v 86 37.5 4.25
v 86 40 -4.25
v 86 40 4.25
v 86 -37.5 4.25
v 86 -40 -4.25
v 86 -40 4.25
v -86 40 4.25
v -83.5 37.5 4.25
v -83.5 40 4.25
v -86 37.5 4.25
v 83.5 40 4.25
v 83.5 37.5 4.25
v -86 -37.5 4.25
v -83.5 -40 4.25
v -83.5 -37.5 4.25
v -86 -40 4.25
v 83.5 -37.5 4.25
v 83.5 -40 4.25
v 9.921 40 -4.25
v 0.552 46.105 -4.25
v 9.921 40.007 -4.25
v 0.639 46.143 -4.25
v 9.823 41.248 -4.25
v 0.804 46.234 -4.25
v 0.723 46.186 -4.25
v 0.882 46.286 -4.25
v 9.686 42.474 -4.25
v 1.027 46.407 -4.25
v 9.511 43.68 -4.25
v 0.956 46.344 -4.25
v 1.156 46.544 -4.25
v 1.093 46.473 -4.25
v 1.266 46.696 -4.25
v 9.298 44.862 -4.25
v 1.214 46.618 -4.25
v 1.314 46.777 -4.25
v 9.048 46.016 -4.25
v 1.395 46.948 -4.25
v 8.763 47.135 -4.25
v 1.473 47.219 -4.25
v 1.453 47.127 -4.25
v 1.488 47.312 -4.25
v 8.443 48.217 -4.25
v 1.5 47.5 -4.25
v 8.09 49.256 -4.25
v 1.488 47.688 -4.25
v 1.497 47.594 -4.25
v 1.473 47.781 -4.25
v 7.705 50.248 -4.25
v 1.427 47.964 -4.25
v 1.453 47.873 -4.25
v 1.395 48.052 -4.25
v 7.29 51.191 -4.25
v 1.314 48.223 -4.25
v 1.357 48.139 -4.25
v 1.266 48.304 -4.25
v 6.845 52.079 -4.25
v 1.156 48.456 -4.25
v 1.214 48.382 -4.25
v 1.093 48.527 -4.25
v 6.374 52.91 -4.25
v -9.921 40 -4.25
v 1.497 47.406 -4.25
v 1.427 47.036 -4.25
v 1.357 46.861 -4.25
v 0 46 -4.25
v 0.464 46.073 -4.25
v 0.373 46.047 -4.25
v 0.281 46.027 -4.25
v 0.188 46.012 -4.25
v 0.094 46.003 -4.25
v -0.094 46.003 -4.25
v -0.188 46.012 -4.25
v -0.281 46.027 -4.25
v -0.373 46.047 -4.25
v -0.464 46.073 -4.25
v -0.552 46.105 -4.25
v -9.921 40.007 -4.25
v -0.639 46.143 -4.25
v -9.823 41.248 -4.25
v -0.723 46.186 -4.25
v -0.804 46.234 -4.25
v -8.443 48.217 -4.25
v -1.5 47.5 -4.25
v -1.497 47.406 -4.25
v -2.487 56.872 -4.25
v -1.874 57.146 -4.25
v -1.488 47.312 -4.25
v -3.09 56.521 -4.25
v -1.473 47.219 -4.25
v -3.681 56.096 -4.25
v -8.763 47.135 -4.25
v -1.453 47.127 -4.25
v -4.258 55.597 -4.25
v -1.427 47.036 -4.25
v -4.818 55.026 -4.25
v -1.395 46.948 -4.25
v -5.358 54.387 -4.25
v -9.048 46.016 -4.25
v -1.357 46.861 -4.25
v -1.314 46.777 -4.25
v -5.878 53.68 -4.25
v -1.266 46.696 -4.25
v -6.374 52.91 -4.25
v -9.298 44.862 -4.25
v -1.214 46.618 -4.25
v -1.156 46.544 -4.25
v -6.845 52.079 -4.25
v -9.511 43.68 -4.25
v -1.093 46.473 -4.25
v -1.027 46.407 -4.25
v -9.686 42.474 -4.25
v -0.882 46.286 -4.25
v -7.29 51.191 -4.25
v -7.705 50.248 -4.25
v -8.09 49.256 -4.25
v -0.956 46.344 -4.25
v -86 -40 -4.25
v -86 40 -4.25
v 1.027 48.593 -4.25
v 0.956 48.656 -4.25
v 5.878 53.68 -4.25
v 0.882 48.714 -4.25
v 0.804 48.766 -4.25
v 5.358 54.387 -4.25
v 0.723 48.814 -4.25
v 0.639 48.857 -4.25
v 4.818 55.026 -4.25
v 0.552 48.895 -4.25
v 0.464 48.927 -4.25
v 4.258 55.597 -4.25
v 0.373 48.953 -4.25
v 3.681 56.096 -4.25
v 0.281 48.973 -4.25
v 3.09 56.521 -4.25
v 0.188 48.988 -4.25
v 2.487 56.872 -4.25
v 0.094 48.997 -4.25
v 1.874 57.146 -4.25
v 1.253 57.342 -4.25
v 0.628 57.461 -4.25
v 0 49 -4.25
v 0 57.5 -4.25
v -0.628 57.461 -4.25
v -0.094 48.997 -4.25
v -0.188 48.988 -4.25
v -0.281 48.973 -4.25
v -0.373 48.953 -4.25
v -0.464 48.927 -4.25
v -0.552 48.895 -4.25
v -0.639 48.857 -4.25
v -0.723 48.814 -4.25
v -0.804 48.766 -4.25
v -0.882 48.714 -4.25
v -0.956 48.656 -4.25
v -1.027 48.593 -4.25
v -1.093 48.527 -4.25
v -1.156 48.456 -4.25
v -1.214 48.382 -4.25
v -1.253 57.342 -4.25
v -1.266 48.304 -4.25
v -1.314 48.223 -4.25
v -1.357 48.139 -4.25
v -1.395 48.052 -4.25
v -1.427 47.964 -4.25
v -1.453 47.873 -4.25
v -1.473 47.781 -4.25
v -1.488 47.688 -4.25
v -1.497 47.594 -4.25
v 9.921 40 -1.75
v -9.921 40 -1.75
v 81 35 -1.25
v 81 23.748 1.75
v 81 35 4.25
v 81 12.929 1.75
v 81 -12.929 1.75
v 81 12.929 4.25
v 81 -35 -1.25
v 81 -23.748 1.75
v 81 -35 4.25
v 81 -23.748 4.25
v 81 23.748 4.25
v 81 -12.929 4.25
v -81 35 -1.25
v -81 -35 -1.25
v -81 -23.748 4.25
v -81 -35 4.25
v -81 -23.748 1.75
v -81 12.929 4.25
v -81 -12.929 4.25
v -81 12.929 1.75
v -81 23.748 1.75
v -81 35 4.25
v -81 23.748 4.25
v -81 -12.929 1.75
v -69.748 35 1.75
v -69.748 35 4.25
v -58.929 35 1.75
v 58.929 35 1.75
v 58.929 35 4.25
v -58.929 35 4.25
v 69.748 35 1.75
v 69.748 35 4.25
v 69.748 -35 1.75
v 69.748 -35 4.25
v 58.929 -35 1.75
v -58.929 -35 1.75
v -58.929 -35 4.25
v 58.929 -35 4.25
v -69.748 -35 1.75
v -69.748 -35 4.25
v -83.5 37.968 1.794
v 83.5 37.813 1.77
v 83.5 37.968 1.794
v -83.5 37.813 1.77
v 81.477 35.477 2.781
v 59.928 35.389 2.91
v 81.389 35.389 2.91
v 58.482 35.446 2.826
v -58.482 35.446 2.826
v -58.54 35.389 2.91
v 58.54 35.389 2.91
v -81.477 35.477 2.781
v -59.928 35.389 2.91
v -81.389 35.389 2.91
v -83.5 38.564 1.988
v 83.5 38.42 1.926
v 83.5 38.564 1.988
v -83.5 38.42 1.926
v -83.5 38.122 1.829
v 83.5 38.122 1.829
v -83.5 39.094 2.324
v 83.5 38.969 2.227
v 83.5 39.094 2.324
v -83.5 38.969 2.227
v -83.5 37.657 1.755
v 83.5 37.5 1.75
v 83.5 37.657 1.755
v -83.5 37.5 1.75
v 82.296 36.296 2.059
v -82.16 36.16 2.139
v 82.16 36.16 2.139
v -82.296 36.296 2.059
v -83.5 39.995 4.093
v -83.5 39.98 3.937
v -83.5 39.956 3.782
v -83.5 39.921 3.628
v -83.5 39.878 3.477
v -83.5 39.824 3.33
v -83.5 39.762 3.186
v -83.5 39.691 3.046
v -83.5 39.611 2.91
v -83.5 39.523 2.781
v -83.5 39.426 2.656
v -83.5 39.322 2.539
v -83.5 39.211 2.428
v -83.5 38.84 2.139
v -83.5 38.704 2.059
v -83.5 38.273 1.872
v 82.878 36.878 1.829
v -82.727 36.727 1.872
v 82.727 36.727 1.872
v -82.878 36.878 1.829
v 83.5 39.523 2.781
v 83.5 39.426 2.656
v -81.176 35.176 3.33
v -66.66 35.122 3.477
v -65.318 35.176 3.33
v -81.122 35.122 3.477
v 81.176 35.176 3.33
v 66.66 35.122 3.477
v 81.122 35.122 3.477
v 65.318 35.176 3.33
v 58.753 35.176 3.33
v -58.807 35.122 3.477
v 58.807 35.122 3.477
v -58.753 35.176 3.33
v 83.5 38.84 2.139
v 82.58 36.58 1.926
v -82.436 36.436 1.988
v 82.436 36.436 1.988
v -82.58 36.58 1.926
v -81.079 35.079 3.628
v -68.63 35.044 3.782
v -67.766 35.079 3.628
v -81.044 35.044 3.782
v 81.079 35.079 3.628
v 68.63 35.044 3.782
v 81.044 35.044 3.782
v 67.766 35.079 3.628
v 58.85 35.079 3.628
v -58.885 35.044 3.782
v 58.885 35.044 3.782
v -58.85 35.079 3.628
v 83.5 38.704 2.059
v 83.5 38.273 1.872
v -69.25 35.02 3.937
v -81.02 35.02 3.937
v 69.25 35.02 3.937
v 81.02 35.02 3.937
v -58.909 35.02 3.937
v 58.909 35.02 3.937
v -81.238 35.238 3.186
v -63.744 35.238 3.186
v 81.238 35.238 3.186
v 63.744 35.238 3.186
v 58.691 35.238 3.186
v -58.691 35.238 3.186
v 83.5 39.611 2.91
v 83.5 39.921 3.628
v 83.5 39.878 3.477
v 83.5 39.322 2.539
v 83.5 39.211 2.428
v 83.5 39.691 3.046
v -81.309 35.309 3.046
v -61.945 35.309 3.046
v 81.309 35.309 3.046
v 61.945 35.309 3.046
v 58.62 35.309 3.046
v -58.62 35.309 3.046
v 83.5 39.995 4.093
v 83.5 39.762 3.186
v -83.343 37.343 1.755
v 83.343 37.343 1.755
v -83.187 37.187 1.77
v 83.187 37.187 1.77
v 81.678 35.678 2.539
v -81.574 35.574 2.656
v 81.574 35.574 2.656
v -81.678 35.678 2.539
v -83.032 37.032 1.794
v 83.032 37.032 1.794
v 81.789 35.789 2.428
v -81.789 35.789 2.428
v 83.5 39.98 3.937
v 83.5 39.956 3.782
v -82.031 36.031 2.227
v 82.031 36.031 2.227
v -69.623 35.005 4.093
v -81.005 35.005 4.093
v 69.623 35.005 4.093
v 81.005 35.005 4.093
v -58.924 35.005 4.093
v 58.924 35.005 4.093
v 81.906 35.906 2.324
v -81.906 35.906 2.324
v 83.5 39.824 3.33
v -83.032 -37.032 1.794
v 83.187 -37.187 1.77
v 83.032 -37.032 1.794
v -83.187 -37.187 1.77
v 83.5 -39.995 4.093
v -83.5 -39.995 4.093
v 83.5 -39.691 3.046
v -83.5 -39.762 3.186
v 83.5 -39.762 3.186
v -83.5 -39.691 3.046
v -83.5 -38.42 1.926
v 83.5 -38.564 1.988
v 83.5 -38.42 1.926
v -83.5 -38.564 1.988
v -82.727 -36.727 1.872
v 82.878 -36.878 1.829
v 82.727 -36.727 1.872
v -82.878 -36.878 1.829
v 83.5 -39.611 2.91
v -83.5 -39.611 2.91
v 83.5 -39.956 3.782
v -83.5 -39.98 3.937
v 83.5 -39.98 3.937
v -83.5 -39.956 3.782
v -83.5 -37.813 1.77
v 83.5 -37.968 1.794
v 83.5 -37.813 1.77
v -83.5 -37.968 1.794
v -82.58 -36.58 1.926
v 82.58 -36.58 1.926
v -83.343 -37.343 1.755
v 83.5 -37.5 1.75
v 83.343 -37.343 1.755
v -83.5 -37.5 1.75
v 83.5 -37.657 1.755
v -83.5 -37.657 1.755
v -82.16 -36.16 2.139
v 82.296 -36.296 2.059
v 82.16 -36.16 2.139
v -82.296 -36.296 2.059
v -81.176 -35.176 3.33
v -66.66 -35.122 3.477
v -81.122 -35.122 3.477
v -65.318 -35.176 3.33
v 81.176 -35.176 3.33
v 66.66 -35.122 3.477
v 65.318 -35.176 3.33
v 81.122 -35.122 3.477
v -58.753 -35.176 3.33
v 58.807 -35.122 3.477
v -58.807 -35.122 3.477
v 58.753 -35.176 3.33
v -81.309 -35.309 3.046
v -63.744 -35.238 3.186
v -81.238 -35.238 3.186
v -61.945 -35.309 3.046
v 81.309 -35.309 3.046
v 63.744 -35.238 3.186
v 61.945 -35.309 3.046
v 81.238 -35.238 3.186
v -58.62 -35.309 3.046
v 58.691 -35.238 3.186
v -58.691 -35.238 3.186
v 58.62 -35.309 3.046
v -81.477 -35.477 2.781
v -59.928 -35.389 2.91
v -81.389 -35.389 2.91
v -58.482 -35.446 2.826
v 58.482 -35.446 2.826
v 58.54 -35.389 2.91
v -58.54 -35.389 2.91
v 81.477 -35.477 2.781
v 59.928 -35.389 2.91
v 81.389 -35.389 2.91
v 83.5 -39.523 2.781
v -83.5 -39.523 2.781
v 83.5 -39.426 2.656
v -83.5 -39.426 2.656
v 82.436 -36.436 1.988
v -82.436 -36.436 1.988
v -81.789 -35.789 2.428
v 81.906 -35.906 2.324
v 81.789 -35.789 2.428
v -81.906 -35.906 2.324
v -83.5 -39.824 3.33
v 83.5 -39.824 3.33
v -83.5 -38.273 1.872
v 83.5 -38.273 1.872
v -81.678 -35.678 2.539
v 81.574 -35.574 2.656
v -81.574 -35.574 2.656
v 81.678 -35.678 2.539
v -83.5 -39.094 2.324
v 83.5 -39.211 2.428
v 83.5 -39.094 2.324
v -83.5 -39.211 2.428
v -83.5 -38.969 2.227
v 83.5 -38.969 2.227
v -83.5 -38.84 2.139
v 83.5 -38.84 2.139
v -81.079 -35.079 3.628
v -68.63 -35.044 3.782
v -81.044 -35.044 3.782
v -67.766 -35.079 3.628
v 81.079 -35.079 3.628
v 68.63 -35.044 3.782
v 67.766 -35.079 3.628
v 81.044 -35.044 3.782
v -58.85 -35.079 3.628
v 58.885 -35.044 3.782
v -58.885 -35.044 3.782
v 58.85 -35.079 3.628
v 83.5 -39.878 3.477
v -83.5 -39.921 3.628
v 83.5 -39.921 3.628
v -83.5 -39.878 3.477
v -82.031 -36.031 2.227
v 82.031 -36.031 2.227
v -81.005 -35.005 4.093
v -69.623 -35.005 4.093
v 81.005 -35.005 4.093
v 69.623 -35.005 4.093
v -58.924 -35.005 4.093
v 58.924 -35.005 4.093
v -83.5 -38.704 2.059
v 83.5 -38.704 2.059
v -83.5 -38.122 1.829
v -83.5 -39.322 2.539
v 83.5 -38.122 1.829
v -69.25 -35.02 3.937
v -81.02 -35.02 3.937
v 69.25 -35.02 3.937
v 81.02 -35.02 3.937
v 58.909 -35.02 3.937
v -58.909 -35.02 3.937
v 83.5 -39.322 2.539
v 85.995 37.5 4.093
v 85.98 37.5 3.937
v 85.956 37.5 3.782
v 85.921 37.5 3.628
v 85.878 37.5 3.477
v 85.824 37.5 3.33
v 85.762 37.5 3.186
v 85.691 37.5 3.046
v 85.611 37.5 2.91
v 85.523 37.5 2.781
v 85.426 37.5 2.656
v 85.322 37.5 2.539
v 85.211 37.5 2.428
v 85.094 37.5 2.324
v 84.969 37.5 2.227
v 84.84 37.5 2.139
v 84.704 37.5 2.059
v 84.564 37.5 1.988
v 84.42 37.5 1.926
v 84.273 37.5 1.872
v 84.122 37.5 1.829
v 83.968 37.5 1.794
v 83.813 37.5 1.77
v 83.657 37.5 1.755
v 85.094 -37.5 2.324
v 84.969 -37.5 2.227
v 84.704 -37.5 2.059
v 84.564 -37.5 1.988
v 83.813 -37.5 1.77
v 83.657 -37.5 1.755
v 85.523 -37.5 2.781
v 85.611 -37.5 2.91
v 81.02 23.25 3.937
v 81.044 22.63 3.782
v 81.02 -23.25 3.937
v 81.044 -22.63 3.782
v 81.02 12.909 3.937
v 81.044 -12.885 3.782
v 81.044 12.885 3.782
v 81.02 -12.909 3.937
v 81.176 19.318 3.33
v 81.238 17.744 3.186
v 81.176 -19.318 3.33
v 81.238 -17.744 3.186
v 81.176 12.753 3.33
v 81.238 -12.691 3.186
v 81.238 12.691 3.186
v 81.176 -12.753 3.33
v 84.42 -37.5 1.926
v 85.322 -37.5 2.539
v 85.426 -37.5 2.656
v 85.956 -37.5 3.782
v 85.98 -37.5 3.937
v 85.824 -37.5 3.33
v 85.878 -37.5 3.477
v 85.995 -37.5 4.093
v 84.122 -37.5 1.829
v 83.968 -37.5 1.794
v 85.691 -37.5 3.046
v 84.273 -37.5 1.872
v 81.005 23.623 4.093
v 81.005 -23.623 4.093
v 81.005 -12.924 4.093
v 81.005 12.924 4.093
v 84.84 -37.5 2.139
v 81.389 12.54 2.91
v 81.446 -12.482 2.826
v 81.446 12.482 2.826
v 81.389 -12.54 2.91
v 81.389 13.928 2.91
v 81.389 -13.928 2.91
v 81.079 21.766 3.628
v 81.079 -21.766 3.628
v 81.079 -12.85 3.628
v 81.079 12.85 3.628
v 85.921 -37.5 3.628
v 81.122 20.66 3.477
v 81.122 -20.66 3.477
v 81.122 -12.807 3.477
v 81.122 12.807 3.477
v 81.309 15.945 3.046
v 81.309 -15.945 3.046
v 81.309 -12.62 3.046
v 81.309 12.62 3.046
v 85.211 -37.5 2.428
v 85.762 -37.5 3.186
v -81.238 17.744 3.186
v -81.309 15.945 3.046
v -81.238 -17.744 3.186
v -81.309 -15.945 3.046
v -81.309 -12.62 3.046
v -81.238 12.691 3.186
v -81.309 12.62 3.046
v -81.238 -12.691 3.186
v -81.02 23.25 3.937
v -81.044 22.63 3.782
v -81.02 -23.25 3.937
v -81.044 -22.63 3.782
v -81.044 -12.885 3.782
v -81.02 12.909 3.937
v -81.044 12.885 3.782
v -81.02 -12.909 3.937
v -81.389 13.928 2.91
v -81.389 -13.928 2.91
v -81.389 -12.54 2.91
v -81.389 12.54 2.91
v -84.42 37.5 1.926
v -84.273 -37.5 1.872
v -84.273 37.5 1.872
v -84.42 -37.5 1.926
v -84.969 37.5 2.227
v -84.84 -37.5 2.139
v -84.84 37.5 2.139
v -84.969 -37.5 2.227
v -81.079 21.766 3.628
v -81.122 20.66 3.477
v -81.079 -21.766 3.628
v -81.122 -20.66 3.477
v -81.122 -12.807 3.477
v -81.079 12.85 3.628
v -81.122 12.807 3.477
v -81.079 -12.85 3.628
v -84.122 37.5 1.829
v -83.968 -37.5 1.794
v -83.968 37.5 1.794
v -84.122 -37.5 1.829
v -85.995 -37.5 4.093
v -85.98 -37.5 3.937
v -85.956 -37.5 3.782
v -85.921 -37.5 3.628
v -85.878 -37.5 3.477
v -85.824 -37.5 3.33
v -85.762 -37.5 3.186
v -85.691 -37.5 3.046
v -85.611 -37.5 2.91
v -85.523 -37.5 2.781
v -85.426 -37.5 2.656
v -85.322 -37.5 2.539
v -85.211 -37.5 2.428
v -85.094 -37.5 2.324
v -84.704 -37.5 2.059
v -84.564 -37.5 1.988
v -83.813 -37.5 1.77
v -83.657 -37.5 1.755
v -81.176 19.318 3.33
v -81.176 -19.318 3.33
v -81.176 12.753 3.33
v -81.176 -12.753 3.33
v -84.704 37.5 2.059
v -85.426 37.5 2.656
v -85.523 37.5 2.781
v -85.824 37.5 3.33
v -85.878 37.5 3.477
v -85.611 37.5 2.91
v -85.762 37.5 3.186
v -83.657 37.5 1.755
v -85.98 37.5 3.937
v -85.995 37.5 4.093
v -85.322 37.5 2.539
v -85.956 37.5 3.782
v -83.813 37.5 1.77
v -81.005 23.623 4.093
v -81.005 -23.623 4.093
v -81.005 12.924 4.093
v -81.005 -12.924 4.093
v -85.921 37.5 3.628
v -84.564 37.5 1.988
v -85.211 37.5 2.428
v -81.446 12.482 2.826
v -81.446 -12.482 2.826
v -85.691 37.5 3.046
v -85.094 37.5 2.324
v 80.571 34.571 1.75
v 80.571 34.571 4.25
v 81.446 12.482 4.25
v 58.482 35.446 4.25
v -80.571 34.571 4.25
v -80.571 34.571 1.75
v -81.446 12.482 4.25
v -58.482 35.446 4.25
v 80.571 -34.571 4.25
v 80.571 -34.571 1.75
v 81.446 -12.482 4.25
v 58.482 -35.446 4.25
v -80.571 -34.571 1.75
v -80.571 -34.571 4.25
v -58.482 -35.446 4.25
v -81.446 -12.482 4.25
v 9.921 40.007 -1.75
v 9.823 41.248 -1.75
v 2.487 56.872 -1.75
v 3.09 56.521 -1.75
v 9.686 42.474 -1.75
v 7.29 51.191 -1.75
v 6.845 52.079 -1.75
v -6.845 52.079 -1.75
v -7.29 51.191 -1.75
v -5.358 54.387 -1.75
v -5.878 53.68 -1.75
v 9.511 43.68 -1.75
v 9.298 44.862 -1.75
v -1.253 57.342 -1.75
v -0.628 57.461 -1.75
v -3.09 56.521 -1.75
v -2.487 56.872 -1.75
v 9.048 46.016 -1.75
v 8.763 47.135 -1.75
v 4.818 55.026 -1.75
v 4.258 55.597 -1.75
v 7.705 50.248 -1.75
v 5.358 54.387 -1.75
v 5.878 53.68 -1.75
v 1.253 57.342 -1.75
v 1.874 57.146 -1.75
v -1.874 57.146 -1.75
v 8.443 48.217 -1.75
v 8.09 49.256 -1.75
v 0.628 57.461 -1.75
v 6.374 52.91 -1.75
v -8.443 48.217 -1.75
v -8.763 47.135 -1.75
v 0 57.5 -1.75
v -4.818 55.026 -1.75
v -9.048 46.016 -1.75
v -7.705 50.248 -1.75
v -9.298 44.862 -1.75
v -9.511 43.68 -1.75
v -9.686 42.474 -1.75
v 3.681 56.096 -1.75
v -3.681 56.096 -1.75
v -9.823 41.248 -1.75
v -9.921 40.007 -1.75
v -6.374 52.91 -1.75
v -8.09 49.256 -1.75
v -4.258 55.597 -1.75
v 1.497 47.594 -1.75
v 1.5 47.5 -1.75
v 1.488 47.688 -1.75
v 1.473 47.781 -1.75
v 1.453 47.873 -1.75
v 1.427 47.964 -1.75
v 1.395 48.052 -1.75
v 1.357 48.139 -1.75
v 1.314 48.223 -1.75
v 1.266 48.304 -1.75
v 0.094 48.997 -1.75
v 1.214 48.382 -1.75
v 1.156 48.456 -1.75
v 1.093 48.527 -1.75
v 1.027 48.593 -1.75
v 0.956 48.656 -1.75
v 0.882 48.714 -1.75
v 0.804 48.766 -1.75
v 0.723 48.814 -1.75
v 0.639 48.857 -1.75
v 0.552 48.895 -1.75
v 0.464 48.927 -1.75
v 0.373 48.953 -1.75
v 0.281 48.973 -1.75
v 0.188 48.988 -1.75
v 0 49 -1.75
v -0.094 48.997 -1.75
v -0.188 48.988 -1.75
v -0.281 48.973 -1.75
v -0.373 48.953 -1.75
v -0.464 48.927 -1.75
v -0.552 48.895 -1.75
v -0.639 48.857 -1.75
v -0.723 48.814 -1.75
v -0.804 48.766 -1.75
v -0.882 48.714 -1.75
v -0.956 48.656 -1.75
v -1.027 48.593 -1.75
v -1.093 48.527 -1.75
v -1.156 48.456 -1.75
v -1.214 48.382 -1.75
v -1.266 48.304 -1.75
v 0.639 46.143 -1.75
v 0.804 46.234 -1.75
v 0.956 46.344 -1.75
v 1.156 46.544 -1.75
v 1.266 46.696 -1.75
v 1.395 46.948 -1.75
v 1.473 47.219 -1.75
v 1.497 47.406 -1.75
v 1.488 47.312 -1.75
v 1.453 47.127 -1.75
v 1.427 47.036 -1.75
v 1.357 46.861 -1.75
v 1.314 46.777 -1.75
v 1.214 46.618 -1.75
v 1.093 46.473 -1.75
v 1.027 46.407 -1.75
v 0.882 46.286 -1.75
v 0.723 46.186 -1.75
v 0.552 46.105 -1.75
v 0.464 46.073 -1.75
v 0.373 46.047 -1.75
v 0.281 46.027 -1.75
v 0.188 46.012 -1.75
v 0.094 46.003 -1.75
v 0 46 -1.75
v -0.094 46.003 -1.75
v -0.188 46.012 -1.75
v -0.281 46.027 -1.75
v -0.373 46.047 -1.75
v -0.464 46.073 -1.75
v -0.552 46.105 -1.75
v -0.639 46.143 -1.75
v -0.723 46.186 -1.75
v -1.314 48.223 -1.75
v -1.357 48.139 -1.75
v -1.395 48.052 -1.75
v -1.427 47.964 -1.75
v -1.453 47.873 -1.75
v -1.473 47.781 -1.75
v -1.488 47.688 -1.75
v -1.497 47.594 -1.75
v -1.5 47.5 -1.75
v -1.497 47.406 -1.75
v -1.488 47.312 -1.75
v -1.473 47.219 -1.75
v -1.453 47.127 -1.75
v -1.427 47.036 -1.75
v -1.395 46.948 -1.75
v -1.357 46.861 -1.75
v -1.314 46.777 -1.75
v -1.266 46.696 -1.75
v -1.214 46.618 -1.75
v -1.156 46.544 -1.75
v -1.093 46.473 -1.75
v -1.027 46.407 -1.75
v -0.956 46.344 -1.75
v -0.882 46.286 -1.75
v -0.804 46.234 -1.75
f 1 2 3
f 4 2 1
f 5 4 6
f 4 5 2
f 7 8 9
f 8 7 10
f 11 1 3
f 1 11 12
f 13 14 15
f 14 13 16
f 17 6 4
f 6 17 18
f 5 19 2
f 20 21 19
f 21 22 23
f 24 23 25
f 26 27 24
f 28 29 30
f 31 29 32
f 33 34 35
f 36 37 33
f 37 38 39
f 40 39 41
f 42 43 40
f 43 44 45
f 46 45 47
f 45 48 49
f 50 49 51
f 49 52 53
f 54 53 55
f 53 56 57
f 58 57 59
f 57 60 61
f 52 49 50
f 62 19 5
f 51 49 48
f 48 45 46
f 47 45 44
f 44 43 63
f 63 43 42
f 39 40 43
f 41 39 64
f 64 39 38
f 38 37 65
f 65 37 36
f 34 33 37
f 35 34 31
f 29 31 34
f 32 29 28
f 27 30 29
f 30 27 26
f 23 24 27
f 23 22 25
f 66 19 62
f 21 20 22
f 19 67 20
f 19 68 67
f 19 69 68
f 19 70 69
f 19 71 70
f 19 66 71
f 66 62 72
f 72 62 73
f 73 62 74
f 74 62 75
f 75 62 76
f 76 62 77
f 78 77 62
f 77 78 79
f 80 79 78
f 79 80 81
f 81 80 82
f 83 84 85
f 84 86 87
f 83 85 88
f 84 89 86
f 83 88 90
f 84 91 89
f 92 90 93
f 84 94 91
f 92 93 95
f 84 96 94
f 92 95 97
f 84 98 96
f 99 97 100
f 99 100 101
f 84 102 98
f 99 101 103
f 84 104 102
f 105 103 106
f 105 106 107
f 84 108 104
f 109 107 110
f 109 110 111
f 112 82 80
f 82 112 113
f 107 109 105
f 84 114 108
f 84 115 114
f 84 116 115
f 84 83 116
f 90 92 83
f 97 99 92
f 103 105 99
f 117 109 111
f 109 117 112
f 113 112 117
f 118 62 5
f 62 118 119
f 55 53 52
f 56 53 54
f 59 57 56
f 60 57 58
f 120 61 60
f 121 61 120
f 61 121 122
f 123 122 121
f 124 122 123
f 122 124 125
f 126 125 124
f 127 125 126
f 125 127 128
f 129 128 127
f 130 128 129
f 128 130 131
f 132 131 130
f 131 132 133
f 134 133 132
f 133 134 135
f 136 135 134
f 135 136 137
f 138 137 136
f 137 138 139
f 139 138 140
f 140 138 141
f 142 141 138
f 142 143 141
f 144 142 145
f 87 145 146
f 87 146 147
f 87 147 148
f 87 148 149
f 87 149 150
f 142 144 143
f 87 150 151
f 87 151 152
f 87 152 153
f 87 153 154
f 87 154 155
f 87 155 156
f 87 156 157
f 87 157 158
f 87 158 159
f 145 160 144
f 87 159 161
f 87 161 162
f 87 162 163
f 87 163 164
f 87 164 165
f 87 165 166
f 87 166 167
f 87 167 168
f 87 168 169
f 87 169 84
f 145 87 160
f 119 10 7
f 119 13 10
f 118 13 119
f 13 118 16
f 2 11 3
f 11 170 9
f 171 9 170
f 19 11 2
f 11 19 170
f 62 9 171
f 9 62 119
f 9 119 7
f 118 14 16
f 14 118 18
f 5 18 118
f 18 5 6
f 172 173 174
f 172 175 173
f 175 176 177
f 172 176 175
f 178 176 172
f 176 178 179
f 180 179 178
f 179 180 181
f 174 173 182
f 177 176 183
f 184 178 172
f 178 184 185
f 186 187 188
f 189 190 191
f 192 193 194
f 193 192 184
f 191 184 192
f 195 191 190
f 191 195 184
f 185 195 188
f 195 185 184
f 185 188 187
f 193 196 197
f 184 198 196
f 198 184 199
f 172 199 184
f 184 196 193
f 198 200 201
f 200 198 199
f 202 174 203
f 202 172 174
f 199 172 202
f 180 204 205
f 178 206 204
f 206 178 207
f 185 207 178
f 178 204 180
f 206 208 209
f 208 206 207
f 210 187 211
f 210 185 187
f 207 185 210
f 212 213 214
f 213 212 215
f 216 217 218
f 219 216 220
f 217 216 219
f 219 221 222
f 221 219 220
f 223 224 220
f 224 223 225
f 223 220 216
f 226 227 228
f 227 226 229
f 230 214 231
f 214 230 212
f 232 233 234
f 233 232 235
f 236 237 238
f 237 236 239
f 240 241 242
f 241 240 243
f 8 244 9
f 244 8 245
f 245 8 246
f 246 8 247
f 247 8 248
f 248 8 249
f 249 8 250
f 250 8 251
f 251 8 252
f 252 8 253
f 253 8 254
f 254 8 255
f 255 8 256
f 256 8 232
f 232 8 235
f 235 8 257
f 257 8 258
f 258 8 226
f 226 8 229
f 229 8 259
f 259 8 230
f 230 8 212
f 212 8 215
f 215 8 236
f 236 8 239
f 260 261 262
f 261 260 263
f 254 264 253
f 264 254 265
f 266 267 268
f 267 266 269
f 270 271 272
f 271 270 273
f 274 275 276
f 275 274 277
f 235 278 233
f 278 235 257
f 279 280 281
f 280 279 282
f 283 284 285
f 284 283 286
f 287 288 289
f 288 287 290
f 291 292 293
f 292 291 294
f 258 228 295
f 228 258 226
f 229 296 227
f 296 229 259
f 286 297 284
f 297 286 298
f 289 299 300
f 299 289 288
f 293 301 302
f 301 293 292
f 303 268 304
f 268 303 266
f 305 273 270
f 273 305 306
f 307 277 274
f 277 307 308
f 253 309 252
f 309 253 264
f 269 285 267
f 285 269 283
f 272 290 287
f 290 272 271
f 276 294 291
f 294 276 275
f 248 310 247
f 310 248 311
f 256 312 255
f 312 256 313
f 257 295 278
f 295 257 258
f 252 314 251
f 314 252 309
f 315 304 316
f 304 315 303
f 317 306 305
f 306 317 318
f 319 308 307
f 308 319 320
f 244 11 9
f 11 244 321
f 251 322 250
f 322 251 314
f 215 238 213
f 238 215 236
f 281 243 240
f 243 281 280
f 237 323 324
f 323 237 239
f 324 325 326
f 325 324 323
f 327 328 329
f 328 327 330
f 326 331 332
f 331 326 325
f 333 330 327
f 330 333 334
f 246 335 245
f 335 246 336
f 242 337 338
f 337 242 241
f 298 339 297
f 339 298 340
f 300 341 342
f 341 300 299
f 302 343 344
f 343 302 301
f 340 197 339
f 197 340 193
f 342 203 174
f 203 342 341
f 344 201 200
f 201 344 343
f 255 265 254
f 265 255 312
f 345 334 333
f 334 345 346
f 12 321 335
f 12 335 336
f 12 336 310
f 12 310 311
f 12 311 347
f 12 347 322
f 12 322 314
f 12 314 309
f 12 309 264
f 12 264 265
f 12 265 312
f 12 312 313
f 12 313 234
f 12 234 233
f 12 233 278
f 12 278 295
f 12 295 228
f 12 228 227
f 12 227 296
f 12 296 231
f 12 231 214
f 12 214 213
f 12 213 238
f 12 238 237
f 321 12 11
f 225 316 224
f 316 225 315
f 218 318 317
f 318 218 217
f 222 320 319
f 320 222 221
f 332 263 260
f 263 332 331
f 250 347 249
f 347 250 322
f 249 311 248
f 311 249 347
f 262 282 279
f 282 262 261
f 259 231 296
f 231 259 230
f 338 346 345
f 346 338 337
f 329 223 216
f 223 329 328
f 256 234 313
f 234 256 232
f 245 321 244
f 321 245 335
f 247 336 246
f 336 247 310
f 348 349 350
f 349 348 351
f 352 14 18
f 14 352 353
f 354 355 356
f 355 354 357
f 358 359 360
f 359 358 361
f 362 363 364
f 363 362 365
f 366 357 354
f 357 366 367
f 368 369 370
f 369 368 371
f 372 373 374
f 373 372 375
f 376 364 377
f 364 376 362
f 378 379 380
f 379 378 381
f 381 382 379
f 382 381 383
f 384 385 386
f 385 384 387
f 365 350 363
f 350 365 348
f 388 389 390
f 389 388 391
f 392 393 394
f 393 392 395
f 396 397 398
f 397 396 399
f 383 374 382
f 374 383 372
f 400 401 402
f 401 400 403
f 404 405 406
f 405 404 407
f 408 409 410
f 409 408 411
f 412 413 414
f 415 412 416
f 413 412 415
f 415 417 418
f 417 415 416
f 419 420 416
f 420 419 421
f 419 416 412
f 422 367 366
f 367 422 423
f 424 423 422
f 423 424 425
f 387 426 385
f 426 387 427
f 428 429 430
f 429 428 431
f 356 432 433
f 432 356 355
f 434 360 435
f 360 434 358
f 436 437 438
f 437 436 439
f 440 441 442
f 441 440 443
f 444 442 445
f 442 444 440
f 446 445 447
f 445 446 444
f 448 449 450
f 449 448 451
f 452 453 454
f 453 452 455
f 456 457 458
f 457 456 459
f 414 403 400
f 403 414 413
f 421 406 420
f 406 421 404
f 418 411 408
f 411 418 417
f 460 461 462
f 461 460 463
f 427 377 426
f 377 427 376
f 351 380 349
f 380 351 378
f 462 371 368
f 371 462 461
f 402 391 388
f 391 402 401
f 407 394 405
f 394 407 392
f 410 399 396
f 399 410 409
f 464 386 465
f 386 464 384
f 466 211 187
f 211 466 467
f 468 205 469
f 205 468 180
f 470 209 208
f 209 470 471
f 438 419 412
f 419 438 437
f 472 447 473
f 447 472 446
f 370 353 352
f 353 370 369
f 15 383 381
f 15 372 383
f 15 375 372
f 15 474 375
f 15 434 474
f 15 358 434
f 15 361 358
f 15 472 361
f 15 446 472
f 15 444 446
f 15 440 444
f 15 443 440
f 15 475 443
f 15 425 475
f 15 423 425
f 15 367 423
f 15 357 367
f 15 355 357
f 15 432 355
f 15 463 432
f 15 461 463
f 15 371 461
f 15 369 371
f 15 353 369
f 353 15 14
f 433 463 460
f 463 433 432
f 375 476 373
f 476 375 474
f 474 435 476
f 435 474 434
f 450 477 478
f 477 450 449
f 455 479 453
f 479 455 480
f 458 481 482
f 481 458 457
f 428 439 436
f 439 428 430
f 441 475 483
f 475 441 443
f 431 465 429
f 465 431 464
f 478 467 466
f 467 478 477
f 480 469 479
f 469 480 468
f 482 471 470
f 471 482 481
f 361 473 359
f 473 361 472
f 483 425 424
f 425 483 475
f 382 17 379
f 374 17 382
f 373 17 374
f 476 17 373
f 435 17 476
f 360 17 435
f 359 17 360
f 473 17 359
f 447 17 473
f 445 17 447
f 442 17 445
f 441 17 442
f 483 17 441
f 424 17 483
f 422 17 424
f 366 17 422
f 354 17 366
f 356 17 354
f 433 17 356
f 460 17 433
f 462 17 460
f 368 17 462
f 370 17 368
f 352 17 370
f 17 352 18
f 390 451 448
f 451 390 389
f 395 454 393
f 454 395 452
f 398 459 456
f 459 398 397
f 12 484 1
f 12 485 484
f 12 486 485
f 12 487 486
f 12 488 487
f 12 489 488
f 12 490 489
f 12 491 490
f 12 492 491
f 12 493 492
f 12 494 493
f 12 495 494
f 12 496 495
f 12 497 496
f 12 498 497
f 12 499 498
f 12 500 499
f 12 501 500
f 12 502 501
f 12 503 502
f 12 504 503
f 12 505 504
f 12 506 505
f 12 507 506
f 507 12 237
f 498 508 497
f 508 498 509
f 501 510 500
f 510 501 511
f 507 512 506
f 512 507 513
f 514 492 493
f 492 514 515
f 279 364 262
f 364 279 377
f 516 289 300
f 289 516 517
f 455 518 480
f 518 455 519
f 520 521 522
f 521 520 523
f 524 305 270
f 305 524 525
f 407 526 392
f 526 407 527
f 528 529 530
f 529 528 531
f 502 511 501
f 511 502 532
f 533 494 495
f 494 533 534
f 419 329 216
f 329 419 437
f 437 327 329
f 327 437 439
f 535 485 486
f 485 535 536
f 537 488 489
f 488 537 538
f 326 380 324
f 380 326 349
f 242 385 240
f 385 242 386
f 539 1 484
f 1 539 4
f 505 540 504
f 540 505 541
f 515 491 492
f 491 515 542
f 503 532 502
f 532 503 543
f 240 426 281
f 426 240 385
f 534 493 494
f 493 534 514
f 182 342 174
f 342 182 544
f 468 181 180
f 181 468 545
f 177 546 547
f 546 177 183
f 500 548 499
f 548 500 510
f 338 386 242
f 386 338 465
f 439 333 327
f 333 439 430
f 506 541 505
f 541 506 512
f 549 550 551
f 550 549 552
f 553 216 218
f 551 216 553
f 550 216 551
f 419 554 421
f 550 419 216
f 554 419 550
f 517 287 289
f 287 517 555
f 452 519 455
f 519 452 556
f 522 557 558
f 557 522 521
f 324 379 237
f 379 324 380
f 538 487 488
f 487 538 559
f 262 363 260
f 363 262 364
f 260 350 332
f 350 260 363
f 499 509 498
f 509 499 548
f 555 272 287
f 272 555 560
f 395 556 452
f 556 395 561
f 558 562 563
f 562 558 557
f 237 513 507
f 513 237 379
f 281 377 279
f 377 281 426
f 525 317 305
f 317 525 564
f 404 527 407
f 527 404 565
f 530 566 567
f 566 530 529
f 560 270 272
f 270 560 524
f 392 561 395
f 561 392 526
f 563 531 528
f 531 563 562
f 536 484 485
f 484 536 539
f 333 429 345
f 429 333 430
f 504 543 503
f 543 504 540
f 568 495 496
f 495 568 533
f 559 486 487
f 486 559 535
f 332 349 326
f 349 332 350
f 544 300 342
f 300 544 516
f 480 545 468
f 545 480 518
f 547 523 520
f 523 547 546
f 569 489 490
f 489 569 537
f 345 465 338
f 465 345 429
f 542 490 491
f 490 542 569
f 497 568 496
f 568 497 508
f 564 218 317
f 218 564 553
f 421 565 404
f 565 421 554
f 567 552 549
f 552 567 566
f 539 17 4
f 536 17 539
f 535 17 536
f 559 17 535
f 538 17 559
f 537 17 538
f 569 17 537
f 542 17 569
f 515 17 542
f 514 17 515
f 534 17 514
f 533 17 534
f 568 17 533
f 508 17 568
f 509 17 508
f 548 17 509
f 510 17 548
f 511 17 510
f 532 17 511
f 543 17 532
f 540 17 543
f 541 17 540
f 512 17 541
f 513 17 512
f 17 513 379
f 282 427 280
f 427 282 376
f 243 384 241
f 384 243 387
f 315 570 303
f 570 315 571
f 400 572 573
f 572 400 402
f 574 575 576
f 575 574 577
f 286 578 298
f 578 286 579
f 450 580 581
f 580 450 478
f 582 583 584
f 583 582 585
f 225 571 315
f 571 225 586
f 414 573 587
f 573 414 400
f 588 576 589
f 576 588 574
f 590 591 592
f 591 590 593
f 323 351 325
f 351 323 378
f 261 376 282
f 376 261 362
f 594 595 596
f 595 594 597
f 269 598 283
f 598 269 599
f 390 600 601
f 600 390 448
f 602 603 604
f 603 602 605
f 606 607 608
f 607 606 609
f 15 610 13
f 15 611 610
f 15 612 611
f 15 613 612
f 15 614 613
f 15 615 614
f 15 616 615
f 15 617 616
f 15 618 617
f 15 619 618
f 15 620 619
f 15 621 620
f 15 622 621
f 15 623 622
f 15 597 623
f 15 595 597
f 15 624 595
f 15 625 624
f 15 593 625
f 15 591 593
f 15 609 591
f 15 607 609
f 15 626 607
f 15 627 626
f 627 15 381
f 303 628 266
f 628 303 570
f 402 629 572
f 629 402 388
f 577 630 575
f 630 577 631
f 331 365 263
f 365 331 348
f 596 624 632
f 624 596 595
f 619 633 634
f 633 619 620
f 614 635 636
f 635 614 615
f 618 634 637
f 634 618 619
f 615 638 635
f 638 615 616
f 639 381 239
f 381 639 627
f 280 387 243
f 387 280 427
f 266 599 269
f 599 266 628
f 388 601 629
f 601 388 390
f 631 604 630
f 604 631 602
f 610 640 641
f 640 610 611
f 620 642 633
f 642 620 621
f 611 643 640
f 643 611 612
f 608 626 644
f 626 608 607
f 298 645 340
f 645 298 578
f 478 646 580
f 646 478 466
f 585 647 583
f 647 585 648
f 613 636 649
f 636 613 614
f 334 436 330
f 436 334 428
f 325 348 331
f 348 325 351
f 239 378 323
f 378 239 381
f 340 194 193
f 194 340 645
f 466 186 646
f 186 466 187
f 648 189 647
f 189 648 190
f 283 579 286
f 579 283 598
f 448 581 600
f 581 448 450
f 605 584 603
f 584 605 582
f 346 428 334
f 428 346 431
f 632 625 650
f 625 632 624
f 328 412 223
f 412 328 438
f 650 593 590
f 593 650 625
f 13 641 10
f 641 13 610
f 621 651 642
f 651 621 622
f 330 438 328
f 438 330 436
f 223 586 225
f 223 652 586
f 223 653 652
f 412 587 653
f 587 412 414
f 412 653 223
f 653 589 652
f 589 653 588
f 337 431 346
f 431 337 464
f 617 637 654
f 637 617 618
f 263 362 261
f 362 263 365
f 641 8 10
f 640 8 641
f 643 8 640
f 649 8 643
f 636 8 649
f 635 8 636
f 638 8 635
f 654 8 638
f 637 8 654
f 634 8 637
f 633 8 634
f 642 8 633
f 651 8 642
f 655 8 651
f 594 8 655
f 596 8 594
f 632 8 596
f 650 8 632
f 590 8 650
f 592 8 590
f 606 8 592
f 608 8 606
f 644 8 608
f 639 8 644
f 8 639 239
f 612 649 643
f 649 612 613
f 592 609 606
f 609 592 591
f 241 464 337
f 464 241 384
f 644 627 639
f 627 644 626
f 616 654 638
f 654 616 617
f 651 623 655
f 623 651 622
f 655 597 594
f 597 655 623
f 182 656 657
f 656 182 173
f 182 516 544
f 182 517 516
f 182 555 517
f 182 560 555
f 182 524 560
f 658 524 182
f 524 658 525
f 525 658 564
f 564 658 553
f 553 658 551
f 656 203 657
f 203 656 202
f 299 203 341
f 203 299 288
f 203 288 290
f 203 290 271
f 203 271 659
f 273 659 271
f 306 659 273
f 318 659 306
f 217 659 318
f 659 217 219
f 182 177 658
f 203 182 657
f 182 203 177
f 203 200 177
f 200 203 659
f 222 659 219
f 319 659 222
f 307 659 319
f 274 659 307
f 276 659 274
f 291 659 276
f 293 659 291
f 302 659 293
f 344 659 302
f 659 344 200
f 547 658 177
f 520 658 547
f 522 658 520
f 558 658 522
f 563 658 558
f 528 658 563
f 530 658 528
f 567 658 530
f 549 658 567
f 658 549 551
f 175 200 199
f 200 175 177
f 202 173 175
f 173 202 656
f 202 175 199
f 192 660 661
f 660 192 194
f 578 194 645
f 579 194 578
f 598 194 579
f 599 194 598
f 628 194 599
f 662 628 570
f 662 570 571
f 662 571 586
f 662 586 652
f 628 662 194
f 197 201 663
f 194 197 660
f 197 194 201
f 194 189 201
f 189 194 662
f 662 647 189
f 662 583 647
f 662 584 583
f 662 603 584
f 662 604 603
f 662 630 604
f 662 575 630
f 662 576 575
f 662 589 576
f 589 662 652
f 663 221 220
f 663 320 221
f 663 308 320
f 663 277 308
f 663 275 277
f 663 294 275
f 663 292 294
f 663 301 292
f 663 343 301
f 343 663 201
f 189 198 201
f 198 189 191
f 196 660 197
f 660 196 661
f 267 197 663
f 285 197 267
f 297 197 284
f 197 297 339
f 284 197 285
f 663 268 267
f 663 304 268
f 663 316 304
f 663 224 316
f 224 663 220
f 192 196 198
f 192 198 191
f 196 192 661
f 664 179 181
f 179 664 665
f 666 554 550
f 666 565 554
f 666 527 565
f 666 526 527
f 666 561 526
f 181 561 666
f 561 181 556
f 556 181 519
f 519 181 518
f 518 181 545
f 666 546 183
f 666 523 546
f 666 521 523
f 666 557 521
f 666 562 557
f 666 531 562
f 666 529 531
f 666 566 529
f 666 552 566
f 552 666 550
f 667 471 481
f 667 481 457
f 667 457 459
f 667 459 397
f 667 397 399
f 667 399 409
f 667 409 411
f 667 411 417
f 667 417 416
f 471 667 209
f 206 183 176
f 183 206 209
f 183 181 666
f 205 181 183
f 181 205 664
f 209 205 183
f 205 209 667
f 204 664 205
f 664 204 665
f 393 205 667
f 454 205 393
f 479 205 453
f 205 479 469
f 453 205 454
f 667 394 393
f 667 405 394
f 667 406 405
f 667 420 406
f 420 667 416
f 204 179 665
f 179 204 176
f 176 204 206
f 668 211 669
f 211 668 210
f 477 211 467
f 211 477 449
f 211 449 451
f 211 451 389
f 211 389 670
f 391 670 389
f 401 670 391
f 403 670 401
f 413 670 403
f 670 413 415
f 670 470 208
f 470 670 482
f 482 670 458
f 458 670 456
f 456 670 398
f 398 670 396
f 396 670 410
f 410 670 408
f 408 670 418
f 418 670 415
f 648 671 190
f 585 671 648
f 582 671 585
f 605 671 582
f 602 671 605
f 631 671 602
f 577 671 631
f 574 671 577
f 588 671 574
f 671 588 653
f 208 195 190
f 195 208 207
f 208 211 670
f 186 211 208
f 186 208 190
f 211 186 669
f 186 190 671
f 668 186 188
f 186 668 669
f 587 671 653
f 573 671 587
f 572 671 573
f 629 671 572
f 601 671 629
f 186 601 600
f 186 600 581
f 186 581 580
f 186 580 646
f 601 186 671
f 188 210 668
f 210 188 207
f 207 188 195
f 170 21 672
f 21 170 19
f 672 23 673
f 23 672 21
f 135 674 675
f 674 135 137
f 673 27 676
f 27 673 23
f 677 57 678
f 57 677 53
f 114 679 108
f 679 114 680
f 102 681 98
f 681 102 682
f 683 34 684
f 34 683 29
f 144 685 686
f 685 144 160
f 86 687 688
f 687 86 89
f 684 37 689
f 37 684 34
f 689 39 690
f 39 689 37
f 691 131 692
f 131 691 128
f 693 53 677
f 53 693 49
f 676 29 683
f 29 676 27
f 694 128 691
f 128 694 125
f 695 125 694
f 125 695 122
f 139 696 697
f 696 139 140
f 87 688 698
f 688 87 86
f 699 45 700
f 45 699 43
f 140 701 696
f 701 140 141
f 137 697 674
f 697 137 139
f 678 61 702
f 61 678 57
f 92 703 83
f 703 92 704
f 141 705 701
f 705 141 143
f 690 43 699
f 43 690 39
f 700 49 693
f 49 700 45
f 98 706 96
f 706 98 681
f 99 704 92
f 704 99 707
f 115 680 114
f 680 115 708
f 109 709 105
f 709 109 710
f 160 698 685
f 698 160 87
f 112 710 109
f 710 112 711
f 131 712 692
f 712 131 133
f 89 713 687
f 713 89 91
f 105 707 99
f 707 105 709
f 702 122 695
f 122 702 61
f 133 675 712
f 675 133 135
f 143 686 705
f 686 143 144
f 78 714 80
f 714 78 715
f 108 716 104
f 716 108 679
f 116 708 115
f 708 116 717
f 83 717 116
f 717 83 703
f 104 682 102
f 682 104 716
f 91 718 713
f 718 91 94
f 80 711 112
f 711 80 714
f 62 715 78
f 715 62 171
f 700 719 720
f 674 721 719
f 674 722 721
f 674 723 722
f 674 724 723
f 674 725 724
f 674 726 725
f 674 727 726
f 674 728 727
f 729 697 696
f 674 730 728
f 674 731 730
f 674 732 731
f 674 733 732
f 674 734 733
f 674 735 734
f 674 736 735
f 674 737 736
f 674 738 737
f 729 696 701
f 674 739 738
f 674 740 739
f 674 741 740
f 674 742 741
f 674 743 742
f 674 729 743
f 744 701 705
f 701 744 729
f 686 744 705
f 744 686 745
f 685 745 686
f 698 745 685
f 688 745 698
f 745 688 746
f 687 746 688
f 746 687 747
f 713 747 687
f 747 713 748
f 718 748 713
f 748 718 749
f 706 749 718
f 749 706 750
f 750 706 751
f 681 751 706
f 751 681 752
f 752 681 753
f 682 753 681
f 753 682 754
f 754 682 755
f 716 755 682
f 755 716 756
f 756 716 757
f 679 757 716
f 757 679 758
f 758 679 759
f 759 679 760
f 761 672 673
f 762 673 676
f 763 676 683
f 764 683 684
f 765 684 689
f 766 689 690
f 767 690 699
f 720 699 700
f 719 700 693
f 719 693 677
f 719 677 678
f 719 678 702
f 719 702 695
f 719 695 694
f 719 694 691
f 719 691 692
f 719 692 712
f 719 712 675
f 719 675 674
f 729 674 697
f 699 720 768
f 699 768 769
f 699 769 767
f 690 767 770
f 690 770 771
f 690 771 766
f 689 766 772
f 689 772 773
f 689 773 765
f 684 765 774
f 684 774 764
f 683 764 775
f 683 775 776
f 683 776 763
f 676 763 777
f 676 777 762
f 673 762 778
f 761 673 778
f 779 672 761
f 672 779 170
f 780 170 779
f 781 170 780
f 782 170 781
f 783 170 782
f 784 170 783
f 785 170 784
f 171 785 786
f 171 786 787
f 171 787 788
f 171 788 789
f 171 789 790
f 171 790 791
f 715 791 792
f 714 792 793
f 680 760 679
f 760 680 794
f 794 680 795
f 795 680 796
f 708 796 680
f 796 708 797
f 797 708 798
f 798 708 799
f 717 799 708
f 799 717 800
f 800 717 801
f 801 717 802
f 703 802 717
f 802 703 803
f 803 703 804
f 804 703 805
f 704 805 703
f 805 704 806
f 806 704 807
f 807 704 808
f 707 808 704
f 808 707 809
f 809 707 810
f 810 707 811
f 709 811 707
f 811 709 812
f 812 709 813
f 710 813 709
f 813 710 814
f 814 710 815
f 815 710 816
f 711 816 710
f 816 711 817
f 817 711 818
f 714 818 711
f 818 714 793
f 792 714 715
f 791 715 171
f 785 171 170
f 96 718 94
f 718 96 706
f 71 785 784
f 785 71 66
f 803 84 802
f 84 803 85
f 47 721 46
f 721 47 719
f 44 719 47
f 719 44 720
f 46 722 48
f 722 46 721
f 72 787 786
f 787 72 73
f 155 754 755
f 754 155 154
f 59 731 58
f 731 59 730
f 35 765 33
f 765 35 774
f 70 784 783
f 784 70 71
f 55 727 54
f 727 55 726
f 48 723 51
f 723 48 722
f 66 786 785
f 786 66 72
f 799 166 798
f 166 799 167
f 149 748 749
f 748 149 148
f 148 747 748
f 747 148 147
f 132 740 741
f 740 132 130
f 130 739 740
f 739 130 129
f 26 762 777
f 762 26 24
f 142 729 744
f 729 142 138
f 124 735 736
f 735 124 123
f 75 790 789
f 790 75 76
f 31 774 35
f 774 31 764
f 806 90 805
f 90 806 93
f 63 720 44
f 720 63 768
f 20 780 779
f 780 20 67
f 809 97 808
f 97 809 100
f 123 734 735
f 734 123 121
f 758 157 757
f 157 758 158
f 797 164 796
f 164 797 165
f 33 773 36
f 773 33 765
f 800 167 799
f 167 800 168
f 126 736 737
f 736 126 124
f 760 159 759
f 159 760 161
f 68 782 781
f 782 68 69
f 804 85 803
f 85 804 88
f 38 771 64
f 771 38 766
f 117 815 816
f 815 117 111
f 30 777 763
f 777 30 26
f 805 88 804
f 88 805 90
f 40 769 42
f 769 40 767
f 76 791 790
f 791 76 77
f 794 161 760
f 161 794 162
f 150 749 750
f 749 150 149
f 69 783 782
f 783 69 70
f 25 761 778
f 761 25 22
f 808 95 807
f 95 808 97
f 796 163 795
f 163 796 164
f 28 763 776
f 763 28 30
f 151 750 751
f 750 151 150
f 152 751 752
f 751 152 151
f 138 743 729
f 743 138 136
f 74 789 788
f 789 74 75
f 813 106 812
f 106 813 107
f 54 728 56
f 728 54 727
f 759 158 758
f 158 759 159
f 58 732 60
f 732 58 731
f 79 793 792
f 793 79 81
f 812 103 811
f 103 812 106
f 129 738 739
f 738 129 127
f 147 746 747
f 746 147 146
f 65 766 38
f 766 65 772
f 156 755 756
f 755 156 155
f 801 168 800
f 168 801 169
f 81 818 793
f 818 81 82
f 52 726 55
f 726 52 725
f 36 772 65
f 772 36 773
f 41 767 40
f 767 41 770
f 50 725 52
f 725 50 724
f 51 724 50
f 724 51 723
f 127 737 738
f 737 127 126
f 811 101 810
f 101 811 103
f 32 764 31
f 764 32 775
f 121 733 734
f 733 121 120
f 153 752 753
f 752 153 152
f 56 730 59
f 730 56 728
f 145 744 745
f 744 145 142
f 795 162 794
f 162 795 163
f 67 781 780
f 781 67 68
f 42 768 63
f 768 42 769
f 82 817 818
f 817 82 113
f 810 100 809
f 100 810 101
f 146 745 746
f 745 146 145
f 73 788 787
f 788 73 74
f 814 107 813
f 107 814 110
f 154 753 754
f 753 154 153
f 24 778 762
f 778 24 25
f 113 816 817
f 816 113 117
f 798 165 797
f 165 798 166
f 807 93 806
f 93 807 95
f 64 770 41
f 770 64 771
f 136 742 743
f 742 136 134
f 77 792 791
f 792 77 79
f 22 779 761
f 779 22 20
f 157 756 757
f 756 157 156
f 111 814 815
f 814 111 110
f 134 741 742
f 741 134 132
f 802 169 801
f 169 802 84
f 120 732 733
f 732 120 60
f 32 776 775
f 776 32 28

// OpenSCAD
//The length of the bill (mm). Don't use exact measurements as, chances are, the thing won't print precisely enough and the bill won't fit, so do round up.
billLength = 162;

//l (mm). Don't use exact measurements as, chances are, the thing won't print precisely enough 
//The width of the biland the bill won't fit, so do round up.
billWidth = 70;

//The thickness of the bill. This SHOULD NOT be an exact measurement and you're completely fine using more space (within reason).
billThick = 5;

//The thickness of the frame length-wise.
frameThickX = 5;

//The thickness of the frame width-wise.
frameThickY = 5;

//The style of the frameshaping cut. A value between 1 and 2 is reccomended. This is how much the frame shaping modules overlap, and it works either way. Default is 1, but you might not like the look so do as you please.
frameShapeStyle = 1;

//The additional thickness of the frame (top to bottom-wise), independent from the bottom and the slot for the bill.
frameThick = 1;

//The thickness of the bottom piece of the frame.
botThick = 2.5;

//The thickness of of the frame triangles.
triangleThick = 2.5;

//The length ("diameter") of the triangles.
triangleLength = 20;

//The width of the triangles.
triangleWidth = 37.5;

//Mode 1 is to have the triangles on the outside corners on the frame, mode 3 is to have triangles on the inner corners of the frame. Had to skip mode 2 just because of how the math works out.
triangleMode = 3;

//Total length of the hook. 
hookLength = 20;

//Total width of the hook
hookWidth = 20;

//Total thickness of the hook.
hookThick = 2.5;

//The size of the hole for the hook.
hookHole = 3;

//The length up from the center the hole should be.
hookHoleUp = 0;

//The detail on all circular objects in the model.
sfn = 100;

//The amount extra to cut through things. Used many times here.
extraCut = 1;


module frame() {
    difference() {
        //The length + the border of the  frame, the width + the border of the frame + the total thickness including the thickness of the bottom, the middle (for the bill) and the thickness of the general frame. Multiply both frame thicknesses for two so both sides have that thickness.
        cube([billLength + frameThickX*2, billWidth + frameThickY*2, frameThick+botThick+billThick], center=true);
        //Moves the frame up to cut through everything except the thickness reserved for the bottom. Saves a step.
        translate([0,0,botThick/2+1]) {
            //The insides that need to be hollowed out, being "subtracted" from the whole piece.
            cube([billLength, billWidth,  frameThick+billThick+1], center=true);
        }
    }
}




module frameShapeX() {
    //Rotate the cylinder that cuts into the frame from a "soup can" or "water bottle" orientation to a "rolling log" type of orientation.
    rotate([0,90,0]) {
        //The size of the frame exactly. The height is the new "length" of the cylinder because it's flipped on its side, so it needs  to be the size of the bill in that directions plus the frame thickness to go all the way. All the way looks different than all the way minus a little bit and they offer different aesthetics, hence why there is a "frameShapeStyle" variable, adjustible above to change the level of overlap of the two cylinders.
        cylinder(r=frameThickX/2, h=billLength+frameThickX*frameShapeStyle, center=true, $fn=sfn);
    }
}
module frameShapeY() {
       //Rotate the cylinder that cuts into the frame from a "soup can" or "water bottle" orientation to a "rolling log" type of orientation.
    rotate([90,0,0]) {
        //The size of the frame exactly. The height is the new "length" of the cylinder because it's flipped on its side, so it needs  to be the size of the bill in that directions plus the frame thickness to go all the way. All the way looks different than all the way minus a little bit and they offer different aesthetics, hence why there is a "frameShapeStyle" variable, adjustible above to change the level of overlap of the two cylinders.
        cylinder(r=frameThickY/2, h=billWidth+frameThickY*frameShapeStyle, center=true, $fn=sfn);
    }
}


module frameTriangle() {
    scale([1,triangleWidth/triangleLength, 1]) {
        cylinder(r=triangleLength/2, h=triangleThick, center=true, $fn=3);
    }
}

module frameShapingX() {
    //Moving the frame to the edge of the frame. Since I don't want the edge of the frame shaping cylinder to be on the edge of the bill, I don't translate it an additional frameThickY/2 to compensate for the size of the cylinder.
    translate([0,(billWidth+frameThickY)/2,(billThick+botThick+frameThick)/2]) {
        frameShapeX();
    }
    //Moving the frame to the edge of the frame. Since I don't want the edge of the frame shaping cylinder to be on the edge of the bill, I don't translate it an additional frameThickX/2 to compensate for the size of the cylinder.
    translate([0,(billWidth+frameThickY)/-2,(billThick+botThick+frameThick)/2]) {
        frameShapeX();
    }
}

module frameShapingY() {
    translate([(billLength+frameThickX)/2,0,(billThick+botThick+frameThick)/2]) {
        frameShapeY();
    }
    translate([(billLength+frameThickX)/-2,0/-2,(billThick+botThick+frameThick)/2]) {
        frameShapeY();
    }
}


module frameTriangles() {
    //For all of these blocks of text in this module, we're moving the triangles to either the outside or inside corners, decided by the triangle mode variable above, and rotating them so that they are in the correct orientation for their respective corners.
    translate([(billLength-frameThickX*triangleMode)/2,(billWidth-frameThickY*triangleMode)/2, (billThick+botThick+frameThick-triangleThick)/2]) {
        rotate([0,0,45]) {
            frameTriangle();
        }
        
    }
    translate([(billLength-frameThickX*triangleMode)/-2,(billWidth-frameThickY*triangleMode)/2, (billThick+botThick+frameThick-triangleThick)/2]) {
        rotate([0,0,135]) {
            frameTriangle();
        }
        
    }
    
    translate([(billLength-frameThickX*triangleMode)/2,(billWidth-frameThickY*triangleMode)/-2, (billThick+botThick+frameThick-triangleThick)/2]) {
        rotate([0,0,315]) {
            frameTriangle();
        }
        
    }
    translate([(billLength-frameThickX*triangleMode)/-2,(billWidth-frameThickY*triangleMode)/-2, (billThick+botThick+frameThick-triangleThick)/2]) {
        rotate([0,0,225]) {
            frameTriangle();
        }
        
    }
}
module shapedFrame() {
    //Subtracting all of the shaping of the frame from the frame itself.
    difference() {
        frame();
        frameShapingX();
        frameShapingY();
    }
}


module hook() {
    //Moving the hook to the edge of the frame.
    translate([0,(billWidth+frameThickY)/2,(billThick+botThick+frameThick-hookThick)/-2]) {
        //Only using half of the hook by cutting off half of it. 
        difference() {
            //Scaling the cylinder up based on the ratio between length and width.
            scale([1,hookLength*2/hookWidth, 1]) {
                //A cylinder for the hook based on the variables above. 
                cylinder(r=hookWidth/2, h=hookThick, center=true, $fn=sfn);
            }
            //Moving the part to cut over.
            translate([0,hookLength/-2,0]) {
                //Added extracut for a clean cut.
                cube([hookWidth+extraCut,hookLength, hookThick+extraCut], center=true);
            }
            translate([0,hookLength/2+hookHoleUp,0]) {
                cylinder(r=hookHole/2, h=hookThick+extraCut, center=true, $fn=sfn);
        }
        }
    }
}

module fullFrame() {
    shapedFrame();
    frameTriangles();
    hook();

}

fullFrame();
